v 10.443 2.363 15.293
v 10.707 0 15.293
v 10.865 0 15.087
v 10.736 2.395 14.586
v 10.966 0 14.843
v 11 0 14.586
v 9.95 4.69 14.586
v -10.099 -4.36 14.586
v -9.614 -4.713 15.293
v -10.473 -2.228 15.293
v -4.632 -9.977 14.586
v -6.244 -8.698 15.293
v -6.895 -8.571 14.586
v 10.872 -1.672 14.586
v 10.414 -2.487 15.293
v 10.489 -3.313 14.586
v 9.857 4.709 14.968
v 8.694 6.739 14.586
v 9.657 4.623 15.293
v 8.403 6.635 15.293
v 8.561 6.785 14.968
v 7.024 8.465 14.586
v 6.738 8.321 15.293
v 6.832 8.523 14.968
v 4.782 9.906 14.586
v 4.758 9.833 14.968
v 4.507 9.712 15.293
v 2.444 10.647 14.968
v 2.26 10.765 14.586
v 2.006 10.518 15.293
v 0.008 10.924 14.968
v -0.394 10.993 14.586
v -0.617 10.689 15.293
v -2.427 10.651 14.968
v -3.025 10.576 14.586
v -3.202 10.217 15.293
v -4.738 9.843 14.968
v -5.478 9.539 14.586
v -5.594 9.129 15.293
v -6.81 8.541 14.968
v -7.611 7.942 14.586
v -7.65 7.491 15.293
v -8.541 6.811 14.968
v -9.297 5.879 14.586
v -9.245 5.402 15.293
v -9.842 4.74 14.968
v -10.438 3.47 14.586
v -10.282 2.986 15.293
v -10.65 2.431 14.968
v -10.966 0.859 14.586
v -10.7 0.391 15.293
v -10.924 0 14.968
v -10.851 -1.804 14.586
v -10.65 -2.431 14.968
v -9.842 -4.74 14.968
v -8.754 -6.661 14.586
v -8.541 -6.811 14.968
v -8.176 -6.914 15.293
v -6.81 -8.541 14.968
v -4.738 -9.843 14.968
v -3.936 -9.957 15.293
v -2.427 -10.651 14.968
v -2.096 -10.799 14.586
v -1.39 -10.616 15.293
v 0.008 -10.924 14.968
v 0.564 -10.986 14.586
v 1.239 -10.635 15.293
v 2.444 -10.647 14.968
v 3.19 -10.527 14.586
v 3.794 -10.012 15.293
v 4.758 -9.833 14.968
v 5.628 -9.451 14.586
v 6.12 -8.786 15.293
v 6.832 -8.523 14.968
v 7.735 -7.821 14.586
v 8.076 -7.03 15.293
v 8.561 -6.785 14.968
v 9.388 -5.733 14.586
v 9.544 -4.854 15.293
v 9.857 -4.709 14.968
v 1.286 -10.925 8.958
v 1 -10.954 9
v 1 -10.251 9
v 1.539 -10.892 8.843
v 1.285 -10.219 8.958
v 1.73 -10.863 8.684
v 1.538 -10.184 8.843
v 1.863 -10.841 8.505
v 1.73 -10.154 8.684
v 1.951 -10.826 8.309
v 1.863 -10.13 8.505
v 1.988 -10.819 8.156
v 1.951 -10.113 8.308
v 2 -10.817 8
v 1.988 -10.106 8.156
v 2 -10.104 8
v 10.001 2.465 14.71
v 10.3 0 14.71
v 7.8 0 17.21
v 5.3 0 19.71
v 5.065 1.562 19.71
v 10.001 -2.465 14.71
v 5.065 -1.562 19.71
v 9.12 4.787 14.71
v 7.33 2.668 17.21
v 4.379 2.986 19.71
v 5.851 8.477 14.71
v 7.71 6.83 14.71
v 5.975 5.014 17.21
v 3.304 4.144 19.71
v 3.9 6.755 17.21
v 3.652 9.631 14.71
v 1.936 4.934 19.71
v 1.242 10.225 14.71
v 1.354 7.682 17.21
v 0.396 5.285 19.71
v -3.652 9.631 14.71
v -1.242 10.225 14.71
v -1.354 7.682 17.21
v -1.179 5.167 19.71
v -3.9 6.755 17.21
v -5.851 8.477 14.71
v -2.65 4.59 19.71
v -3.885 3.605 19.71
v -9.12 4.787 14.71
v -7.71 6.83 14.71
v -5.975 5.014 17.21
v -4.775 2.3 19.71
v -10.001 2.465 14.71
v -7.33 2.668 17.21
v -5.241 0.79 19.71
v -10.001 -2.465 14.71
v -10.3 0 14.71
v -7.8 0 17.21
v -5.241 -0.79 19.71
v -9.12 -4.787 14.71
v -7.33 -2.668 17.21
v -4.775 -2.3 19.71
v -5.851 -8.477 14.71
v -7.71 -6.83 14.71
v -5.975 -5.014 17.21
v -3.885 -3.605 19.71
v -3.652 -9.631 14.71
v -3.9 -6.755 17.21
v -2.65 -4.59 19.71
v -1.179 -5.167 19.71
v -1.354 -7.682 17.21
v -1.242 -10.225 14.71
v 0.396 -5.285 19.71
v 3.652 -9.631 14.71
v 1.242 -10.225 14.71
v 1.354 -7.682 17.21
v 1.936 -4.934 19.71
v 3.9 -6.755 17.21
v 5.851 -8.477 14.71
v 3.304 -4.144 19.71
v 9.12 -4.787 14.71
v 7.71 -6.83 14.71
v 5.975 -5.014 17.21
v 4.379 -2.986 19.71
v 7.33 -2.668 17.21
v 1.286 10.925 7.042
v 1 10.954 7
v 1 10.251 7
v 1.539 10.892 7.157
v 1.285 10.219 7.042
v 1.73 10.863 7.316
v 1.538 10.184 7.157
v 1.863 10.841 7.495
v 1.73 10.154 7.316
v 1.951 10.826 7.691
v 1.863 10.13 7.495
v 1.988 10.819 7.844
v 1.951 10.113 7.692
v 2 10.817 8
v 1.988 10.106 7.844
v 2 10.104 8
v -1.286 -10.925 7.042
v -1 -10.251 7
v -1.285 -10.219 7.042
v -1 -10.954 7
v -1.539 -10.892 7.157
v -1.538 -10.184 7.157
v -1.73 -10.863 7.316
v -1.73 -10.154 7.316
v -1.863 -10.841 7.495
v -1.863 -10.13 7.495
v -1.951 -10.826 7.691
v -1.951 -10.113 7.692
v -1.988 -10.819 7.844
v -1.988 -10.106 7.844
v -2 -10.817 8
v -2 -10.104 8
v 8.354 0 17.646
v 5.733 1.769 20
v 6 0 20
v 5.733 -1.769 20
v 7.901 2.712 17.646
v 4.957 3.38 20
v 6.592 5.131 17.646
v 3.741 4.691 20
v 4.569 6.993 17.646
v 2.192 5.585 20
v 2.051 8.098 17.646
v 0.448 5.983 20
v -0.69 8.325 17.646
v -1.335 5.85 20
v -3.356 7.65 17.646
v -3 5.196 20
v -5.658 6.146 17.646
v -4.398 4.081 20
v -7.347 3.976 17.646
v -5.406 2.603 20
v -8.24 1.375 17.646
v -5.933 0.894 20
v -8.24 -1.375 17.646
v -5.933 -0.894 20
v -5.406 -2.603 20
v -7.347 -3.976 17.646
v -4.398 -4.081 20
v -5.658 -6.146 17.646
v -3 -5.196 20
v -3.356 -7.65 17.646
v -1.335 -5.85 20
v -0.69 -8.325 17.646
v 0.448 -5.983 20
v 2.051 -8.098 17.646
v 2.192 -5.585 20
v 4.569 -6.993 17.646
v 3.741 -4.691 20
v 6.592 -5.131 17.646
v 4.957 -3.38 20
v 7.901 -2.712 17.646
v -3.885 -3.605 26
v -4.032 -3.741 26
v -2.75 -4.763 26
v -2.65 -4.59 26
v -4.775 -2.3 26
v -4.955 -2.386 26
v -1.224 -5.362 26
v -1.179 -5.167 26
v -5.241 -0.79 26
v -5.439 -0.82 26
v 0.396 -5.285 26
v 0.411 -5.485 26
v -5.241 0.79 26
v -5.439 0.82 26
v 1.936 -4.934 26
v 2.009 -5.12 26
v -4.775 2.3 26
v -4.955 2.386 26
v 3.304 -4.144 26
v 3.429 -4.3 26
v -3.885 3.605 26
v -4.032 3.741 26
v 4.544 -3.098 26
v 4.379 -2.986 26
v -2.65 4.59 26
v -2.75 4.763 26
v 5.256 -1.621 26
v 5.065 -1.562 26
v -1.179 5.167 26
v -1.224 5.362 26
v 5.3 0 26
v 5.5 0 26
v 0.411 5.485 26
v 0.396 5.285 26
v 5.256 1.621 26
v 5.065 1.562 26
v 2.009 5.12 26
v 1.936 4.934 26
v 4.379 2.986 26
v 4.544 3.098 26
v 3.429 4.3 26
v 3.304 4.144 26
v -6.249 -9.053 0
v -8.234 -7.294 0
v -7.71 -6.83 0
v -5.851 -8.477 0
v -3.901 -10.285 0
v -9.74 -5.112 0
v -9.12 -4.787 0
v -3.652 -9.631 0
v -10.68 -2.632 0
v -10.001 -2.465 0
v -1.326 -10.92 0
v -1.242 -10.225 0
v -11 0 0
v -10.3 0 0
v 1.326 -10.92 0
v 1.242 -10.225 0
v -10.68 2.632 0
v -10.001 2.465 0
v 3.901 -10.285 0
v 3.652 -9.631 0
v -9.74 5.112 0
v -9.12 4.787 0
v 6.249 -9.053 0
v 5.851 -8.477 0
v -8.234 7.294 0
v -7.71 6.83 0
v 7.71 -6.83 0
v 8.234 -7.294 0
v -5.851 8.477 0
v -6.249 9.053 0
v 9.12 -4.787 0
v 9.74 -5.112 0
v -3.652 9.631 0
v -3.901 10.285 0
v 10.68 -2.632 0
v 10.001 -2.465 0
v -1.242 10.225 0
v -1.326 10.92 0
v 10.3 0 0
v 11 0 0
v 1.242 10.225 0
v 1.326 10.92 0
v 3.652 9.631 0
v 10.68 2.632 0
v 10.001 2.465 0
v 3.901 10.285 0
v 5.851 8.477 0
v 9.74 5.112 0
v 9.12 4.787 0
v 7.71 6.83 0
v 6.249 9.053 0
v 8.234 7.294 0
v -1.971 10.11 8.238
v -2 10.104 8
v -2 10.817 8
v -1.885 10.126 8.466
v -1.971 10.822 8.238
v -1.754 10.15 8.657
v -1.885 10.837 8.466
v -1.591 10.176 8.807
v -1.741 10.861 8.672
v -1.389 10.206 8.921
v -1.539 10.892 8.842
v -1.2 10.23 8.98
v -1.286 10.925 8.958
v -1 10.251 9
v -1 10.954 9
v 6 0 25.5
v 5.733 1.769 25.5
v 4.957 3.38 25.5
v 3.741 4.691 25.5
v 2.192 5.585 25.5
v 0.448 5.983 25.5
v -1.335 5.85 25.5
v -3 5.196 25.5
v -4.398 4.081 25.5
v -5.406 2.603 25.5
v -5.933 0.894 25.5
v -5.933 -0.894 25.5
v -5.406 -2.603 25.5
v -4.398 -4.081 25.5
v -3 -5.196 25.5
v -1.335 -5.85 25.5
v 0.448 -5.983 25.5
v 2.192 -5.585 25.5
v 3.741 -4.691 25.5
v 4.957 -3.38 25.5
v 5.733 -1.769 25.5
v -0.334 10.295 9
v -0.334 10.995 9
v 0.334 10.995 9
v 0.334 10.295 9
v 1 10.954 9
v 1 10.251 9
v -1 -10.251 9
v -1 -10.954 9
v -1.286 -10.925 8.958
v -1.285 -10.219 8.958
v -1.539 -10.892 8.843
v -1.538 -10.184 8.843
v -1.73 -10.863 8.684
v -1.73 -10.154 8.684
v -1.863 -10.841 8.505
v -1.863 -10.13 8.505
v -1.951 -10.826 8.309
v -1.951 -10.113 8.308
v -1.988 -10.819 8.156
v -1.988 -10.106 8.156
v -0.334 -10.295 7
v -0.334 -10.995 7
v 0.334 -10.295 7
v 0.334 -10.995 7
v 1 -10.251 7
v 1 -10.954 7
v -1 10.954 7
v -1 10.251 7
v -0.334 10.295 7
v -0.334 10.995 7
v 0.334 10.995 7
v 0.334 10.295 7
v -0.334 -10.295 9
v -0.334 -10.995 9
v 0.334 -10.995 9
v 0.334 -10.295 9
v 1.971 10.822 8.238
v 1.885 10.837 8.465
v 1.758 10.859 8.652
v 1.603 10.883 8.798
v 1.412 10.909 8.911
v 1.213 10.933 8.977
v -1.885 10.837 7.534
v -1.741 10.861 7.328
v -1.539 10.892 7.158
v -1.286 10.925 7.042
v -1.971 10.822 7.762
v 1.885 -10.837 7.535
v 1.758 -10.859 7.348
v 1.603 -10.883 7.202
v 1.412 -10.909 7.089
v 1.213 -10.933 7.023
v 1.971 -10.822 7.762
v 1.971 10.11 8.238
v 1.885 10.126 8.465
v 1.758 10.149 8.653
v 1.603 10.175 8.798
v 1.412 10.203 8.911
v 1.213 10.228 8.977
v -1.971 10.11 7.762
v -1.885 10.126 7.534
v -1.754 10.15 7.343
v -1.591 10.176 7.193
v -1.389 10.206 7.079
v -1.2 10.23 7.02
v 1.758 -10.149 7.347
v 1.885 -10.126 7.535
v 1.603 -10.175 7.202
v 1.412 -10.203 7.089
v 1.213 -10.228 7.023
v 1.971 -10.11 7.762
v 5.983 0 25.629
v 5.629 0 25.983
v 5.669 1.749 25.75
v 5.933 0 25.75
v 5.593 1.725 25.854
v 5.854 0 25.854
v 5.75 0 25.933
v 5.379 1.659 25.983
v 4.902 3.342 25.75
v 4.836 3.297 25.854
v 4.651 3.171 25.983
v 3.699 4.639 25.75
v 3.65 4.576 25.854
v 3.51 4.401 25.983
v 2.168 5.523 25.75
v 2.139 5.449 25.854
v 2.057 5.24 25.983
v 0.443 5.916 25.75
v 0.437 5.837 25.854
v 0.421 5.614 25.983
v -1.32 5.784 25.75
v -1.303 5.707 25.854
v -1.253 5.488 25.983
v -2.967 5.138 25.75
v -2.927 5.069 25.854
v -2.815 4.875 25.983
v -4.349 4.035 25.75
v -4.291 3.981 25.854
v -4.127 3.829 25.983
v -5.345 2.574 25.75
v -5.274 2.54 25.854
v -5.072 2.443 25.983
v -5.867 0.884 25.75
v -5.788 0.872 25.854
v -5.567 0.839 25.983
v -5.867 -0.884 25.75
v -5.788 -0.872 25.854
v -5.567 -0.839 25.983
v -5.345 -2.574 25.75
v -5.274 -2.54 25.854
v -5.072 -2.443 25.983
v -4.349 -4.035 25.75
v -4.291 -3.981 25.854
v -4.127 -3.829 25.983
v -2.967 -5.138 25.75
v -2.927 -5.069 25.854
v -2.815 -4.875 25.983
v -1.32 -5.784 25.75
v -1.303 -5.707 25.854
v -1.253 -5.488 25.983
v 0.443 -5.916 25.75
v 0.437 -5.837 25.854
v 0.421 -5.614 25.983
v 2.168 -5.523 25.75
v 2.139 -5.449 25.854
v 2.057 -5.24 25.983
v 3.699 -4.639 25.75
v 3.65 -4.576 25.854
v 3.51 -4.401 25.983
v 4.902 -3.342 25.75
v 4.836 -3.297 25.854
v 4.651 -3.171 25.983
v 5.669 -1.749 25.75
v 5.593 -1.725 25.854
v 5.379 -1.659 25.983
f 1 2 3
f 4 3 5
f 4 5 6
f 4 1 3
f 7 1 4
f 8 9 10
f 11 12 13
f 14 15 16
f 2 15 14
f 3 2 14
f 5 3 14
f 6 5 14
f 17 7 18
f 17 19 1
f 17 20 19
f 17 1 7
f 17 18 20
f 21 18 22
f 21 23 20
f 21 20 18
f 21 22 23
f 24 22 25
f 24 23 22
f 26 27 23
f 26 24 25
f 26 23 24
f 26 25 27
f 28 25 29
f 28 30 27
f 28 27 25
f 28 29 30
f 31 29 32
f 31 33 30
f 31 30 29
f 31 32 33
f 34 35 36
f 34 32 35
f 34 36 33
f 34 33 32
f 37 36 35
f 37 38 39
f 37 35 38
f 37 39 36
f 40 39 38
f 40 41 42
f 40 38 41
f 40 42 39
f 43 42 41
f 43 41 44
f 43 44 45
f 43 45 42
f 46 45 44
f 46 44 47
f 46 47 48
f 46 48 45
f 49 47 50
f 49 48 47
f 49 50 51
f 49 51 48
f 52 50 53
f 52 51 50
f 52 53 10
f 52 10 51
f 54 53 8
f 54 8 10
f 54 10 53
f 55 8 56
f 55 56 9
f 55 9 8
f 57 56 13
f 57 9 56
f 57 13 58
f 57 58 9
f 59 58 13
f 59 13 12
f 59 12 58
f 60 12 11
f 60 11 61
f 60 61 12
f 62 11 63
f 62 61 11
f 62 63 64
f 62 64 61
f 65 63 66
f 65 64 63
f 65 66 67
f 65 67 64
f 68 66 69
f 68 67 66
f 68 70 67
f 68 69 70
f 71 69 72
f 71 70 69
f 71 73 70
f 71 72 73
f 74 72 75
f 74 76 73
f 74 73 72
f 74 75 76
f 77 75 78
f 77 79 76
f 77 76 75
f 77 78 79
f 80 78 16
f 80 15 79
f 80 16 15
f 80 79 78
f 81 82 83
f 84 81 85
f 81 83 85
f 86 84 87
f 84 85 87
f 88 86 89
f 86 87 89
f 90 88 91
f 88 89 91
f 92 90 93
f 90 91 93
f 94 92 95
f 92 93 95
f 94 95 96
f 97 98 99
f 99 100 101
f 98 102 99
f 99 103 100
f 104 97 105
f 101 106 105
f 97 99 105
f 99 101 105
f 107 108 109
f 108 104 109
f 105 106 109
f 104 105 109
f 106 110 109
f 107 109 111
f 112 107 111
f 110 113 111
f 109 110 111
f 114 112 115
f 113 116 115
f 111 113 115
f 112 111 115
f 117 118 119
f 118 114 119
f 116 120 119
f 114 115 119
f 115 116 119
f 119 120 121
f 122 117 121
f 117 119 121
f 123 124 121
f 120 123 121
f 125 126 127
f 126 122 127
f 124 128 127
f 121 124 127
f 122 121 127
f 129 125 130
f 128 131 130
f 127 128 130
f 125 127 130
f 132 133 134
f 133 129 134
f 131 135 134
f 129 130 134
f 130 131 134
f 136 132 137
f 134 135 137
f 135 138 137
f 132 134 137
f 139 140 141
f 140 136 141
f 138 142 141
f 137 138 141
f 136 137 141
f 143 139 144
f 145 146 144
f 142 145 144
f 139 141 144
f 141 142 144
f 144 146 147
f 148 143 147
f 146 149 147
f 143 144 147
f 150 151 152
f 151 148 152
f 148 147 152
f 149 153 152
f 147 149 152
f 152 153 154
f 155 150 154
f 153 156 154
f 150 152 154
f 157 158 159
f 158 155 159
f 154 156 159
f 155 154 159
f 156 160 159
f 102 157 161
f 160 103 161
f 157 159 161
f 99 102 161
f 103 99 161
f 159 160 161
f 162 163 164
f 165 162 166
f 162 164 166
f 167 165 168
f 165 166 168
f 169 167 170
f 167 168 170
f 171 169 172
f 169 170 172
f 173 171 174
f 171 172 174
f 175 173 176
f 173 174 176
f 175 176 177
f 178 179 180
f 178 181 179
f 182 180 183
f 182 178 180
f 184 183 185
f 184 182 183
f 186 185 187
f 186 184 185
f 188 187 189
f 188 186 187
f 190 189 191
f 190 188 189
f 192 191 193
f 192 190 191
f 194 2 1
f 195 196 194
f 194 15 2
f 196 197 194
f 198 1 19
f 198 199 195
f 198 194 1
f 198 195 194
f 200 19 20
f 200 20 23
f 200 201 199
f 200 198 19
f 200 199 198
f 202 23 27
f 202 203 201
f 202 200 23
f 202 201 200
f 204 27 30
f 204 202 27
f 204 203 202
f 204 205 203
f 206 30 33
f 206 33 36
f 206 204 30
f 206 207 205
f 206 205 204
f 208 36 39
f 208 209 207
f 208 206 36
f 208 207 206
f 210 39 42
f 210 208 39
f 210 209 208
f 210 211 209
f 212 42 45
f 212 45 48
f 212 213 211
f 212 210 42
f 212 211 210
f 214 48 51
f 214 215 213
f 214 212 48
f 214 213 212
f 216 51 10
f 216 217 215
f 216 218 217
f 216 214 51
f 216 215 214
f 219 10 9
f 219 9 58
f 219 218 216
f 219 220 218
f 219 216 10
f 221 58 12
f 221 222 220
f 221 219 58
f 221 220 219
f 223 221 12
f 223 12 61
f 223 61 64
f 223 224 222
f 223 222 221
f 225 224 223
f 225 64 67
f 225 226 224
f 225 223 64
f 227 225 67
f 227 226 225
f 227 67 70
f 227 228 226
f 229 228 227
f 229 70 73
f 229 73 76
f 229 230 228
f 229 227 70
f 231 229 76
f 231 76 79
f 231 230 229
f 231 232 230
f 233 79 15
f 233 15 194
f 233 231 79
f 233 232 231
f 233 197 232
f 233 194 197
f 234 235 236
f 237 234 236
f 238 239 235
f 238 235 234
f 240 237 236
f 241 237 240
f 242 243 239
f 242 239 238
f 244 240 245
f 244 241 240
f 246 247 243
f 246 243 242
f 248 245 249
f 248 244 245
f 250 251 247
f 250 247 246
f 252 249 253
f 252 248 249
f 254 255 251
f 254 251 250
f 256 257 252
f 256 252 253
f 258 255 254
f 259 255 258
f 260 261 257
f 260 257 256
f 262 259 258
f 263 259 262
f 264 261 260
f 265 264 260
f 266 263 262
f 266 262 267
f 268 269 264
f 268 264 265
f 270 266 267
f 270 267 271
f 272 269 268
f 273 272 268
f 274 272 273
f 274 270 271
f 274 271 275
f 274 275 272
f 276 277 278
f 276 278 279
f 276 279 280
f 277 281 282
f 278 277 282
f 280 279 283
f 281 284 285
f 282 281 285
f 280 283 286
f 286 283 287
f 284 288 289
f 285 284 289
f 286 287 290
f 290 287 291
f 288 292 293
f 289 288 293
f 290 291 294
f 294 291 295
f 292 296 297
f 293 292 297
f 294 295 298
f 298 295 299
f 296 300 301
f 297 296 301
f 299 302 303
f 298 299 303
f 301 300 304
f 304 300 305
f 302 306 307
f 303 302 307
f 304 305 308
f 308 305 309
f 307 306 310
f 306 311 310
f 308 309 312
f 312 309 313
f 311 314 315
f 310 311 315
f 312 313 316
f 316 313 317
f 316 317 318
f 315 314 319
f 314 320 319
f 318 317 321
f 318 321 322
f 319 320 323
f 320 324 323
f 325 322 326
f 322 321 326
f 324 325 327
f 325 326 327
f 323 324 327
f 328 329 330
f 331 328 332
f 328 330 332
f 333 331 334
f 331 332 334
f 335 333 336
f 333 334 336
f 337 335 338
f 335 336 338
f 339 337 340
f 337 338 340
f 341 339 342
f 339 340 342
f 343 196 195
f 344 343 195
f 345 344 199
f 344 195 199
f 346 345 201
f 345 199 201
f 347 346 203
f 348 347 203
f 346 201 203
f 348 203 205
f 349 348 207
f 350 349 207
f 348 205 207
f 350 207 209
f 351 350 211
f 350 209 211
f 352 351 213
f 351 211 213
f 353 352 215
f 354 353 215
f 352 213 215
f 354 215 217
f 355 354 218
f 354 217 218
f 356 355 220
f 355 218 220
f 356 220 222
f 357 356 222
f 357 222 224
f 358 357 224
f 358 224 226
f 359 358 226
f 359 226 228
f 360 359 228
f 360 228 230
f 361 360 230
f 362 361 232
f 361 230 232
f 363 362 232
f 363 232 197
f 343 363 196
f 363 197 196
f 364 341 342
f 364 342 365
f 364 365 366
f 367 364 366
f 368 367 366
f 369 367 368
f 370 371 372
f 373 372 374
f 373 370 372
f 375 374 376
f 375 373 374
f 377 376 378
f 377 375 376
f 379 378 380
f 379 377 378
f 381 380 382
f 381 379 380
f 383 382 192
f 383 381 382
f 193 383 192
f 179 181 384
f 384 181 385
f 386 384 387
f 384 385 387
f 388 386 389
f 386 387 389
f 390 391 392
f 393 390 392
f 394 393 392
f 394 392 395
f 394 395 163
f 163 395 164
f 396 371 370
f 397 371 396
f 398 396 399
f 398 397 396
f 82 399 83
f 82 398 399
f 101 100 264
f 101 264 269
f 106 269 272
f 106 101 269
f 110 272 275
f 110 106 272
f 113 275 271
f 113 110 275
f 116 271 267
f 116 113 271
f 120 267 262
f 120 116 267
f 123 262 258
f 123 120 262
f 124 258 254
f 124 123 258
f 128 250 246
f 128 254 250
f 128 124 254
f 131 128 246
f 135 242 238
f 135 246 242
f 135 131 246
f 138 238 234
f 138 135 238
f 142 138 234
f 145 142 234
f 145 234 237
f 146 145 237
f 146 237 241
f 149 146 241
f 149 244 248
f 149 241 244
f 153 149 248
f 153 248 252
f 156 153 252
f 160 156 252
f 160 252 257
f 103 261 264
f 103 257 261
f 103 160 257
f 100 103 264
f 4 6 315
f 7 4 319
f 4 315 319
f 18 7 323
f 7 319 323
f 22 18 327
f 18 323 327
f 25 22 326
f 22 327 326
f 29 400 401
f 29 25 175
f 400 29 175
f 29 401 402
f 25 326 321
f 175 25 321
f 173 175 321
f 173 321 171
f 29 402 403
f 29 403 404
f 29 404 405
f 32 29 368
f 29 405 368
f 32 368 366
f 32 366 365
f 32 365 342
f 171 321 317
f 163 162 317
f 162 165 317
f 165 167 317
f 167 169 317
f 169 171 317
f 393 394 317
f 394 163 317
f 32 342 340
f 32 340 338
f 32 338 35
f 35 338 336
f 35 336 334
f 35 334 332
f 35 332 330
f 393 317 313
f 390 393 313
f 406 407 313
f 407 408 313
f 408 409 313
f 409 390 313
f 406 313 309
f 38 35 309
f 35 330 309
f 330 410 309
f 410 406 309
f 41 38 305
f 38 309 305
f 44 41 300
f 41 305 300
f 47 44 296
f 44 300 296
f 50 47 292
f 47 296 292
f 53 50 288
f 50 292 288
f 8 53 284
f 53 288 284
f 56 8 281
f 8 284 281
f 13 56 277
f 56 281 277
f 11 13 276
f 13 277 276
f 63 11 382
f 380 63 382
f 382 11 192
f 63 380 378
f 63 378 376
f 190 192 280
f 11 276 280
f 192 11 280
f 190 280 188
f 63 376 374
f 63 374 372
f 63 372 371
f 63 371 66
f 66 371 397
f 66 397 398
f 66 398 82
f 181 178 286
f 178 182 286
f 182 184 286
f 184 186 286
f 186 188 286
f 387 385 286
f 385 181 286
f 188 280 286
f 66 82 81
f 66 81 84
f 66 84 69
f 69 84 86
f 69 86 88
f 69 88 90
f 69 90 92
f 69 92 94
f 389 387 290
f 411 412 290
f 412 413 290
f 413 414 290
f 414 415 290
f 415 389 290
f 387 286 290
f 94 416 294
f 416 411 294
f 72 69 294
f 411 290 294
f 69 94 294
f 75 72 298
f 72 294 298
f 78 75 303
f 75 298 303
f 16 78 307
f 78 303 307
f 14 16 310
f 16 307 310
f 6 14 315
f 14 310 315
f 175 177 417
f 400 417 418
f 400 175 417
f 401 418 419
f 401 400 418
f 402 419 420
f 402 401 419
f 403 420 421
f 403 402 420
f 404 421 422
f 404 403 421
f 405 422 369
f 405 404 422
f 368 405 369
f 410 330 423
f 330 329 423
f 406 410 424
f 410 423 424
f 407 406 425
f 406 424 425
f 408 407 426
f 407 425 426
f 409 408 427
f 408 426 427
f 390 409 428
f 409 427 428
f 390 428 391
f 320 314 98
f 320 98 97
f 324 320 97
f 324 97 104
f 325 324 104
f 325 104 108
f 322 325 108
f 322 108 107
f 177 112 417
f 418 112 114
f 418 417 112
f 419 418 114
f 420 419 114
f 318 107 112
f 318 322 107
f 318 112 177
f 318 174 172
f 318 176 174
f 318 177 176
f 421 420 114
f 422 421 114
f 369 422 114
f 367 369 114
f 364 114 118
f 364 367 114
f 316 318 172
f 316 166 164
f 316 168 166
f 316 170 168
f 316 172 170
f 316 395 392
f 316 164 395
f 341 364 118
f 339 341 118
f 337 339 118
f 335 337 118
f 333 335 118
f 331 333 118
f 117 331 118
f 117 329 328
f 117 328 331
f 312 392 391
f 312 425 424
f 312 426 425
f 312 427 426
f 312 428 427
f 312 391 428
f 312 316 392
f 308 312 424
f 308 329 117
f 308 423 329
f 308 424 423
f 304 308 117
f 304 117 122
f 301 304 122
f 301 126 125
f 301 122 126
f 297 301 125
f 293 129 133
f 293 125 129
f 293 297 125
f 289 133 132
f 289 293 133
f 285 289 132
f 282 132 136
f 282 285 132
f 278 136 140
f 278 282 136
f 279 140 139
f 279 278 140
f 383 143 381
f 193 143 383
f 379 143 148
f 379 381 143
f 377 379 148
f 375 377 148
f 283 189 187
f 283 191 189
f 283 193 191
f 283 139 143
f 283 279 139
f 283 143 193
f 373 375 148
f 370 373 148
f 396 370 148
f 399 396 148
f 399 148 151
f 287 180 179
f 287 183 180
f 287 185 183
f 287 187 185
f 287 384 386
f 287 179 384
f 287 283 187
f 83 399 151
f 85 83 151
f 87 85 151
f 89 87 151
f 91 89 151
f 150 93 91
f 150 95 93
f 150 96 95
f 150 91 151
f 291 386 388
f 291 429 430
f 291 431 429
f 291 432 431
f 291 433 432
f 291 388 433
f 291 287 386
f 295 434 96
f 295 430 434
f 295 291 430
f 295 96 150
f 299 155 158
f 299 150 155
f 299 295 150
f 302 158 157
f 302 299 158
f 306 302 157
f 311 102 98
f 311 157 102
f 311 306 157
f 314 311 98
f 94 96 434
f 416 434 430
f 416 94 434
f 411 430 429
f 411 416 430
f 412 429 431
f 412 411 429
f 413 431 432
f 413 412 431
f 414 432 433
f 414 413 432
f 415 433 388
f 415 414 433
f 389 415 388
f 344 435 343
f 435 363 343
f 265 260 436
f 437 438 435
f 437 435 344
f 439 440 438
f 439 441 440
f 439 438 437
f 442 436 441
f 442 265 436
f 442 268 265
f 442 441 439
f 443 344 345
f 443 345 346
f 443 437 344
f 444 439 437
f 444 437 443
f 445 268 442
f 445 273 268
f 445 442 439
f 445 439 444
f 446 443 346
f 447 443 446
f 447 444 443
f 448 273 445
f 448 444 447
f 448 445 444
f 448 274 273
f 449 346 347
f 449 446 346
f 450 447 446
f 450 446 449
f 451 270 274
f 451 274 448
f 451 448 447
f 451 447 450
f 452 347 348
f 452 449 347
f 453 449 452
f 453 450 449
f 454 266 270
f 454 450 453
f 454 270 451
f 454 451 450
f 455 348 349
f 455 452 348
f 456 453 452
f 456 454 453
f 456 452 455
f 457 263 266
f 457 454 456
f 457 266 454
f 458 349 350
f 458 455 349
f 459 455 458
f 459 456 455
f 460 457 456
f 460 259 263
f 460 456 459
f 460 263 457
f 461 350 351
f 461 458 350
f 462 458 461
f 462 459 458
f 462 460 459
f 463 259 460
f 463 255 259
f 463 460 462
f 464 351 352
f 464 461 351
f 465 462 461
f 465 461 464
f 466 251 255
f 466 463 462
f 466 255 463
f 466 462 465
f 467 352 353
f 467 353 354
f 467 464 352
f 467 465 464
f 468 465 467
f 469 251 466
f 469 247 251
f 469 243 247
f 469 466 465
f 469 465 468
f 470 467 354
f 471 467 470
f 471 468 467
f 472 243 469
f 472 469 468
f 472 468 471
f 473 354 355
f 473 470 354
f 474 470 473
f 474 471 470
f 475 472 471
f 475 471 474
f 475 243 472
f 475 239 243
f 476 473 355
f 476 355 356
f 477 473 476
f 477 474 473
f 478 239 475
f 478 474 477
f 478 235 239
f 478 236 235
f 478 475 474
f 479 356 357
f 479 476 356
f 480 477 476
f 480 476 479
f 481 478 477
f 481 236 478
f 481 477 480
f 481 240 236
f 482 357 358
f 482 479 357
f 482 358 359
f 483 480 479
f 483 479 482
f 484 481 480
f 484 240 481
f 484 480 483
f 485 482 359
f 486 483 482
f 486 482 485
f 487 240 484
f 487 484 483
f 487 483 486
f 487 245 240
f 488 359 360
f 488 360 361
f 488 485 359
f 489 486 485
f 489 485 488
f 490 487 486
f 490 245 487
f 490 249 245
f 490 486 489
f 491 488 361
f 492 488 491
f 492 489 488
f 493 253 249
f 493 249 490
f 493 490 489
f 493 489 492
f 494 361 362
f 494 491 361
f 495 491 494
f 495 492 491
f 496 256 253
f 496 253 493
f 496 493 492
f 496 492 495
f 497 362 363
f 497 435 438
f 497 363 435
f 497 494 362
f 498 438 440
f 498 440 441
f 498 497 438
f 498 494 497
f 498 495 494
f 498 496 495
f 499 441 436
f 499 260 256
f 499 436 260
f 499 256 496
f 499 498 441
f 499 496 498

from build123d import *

# Parameters (mm, degrees)
F0_R     = 11
F1_DEPTH = 20
F2_SIZE  = 5
F3_DEPTH = 6
F4_T     = -0.7
F5_W     = 4
F5_H     = 2
F6_DEPTH = 12.5
F7_R     = 0.99999
F8_R     = 0.5
F9_R     = 1


# Not quite as in the source:
# - a fillet or chamfer is up to 0.001 mm smaller than in the source, because OpenCascade refuses the exact size


with BuildPart() as f1:
    # F0 (on Top) → F1 (new body)
    with BuildSketch(Plane.XY):
        Circle(F0_R)
    extrude(amount=F1_DEPTH)

    # F2
    f2_edges = [f1.edges().sort_by_distance(p)[0] for p in [
        (-11, 0, 20),
    ]]
    chamfer(f2_edges, length=F2_SIZE)

    # F3 (add): a face of the model
    f3_faces = [f1.faces().sort_by_distance(p)[0] for p in [
        (0, 0, 20),
    ]]
    extrude(f3_faces, amount=F3_DEPTH)

    # F4
    f4_openings = [f1.faces().sort_by_distance(p)[0] for p in [
        (0, 0, 26),
        (0, 0, 0),
    ]]
    offset(amount=F4_T, openings=f4_openings, kind=Kind.INTERSECTION)

    # F5 (on Front) → F6 (cut, symmetric)
    with BuildSketch(Plane.XZ):
        with Locations((0, 8)):
            Rectangle(F5_W, F5_H)
    extrude(amount=F6_DEPTH, both=True, mode=Mode.SUBTRACT)

    # F7 (radius 1 in the source; OpenCascade refuses exactly that, so slightly less here)
    f7_edges = [f1.edges().sort_by_distance(p)[0] for p in [
        (-2, 10.460307, 7),
        (-2, -10.460307, 7),
        (2, 10.460307, 9),
        (2, -10.460307, 9),
        (-2, 10.460307, 9),
        (-2, -10.460307, 9),
        (2, 10.460307, 7),
        (2, -10.460307, 7),
    ]]
    fillet(f7_edges, radius=F7_R)

    # F8
    f8_edges = [f1.edges().sort_by_distance(p)[0] for p in [
        (-6, 0, 26),
    ]]
    fillet(f8_edges, radius=F8_R)

    # F9
    f9_edges = [f1.edges().sort_by_distance(p)[0] for p in [
        (-11, 0, 15),
    ]]
    fillet(f9_edges, radius=F9_R)


solid = f1.part
